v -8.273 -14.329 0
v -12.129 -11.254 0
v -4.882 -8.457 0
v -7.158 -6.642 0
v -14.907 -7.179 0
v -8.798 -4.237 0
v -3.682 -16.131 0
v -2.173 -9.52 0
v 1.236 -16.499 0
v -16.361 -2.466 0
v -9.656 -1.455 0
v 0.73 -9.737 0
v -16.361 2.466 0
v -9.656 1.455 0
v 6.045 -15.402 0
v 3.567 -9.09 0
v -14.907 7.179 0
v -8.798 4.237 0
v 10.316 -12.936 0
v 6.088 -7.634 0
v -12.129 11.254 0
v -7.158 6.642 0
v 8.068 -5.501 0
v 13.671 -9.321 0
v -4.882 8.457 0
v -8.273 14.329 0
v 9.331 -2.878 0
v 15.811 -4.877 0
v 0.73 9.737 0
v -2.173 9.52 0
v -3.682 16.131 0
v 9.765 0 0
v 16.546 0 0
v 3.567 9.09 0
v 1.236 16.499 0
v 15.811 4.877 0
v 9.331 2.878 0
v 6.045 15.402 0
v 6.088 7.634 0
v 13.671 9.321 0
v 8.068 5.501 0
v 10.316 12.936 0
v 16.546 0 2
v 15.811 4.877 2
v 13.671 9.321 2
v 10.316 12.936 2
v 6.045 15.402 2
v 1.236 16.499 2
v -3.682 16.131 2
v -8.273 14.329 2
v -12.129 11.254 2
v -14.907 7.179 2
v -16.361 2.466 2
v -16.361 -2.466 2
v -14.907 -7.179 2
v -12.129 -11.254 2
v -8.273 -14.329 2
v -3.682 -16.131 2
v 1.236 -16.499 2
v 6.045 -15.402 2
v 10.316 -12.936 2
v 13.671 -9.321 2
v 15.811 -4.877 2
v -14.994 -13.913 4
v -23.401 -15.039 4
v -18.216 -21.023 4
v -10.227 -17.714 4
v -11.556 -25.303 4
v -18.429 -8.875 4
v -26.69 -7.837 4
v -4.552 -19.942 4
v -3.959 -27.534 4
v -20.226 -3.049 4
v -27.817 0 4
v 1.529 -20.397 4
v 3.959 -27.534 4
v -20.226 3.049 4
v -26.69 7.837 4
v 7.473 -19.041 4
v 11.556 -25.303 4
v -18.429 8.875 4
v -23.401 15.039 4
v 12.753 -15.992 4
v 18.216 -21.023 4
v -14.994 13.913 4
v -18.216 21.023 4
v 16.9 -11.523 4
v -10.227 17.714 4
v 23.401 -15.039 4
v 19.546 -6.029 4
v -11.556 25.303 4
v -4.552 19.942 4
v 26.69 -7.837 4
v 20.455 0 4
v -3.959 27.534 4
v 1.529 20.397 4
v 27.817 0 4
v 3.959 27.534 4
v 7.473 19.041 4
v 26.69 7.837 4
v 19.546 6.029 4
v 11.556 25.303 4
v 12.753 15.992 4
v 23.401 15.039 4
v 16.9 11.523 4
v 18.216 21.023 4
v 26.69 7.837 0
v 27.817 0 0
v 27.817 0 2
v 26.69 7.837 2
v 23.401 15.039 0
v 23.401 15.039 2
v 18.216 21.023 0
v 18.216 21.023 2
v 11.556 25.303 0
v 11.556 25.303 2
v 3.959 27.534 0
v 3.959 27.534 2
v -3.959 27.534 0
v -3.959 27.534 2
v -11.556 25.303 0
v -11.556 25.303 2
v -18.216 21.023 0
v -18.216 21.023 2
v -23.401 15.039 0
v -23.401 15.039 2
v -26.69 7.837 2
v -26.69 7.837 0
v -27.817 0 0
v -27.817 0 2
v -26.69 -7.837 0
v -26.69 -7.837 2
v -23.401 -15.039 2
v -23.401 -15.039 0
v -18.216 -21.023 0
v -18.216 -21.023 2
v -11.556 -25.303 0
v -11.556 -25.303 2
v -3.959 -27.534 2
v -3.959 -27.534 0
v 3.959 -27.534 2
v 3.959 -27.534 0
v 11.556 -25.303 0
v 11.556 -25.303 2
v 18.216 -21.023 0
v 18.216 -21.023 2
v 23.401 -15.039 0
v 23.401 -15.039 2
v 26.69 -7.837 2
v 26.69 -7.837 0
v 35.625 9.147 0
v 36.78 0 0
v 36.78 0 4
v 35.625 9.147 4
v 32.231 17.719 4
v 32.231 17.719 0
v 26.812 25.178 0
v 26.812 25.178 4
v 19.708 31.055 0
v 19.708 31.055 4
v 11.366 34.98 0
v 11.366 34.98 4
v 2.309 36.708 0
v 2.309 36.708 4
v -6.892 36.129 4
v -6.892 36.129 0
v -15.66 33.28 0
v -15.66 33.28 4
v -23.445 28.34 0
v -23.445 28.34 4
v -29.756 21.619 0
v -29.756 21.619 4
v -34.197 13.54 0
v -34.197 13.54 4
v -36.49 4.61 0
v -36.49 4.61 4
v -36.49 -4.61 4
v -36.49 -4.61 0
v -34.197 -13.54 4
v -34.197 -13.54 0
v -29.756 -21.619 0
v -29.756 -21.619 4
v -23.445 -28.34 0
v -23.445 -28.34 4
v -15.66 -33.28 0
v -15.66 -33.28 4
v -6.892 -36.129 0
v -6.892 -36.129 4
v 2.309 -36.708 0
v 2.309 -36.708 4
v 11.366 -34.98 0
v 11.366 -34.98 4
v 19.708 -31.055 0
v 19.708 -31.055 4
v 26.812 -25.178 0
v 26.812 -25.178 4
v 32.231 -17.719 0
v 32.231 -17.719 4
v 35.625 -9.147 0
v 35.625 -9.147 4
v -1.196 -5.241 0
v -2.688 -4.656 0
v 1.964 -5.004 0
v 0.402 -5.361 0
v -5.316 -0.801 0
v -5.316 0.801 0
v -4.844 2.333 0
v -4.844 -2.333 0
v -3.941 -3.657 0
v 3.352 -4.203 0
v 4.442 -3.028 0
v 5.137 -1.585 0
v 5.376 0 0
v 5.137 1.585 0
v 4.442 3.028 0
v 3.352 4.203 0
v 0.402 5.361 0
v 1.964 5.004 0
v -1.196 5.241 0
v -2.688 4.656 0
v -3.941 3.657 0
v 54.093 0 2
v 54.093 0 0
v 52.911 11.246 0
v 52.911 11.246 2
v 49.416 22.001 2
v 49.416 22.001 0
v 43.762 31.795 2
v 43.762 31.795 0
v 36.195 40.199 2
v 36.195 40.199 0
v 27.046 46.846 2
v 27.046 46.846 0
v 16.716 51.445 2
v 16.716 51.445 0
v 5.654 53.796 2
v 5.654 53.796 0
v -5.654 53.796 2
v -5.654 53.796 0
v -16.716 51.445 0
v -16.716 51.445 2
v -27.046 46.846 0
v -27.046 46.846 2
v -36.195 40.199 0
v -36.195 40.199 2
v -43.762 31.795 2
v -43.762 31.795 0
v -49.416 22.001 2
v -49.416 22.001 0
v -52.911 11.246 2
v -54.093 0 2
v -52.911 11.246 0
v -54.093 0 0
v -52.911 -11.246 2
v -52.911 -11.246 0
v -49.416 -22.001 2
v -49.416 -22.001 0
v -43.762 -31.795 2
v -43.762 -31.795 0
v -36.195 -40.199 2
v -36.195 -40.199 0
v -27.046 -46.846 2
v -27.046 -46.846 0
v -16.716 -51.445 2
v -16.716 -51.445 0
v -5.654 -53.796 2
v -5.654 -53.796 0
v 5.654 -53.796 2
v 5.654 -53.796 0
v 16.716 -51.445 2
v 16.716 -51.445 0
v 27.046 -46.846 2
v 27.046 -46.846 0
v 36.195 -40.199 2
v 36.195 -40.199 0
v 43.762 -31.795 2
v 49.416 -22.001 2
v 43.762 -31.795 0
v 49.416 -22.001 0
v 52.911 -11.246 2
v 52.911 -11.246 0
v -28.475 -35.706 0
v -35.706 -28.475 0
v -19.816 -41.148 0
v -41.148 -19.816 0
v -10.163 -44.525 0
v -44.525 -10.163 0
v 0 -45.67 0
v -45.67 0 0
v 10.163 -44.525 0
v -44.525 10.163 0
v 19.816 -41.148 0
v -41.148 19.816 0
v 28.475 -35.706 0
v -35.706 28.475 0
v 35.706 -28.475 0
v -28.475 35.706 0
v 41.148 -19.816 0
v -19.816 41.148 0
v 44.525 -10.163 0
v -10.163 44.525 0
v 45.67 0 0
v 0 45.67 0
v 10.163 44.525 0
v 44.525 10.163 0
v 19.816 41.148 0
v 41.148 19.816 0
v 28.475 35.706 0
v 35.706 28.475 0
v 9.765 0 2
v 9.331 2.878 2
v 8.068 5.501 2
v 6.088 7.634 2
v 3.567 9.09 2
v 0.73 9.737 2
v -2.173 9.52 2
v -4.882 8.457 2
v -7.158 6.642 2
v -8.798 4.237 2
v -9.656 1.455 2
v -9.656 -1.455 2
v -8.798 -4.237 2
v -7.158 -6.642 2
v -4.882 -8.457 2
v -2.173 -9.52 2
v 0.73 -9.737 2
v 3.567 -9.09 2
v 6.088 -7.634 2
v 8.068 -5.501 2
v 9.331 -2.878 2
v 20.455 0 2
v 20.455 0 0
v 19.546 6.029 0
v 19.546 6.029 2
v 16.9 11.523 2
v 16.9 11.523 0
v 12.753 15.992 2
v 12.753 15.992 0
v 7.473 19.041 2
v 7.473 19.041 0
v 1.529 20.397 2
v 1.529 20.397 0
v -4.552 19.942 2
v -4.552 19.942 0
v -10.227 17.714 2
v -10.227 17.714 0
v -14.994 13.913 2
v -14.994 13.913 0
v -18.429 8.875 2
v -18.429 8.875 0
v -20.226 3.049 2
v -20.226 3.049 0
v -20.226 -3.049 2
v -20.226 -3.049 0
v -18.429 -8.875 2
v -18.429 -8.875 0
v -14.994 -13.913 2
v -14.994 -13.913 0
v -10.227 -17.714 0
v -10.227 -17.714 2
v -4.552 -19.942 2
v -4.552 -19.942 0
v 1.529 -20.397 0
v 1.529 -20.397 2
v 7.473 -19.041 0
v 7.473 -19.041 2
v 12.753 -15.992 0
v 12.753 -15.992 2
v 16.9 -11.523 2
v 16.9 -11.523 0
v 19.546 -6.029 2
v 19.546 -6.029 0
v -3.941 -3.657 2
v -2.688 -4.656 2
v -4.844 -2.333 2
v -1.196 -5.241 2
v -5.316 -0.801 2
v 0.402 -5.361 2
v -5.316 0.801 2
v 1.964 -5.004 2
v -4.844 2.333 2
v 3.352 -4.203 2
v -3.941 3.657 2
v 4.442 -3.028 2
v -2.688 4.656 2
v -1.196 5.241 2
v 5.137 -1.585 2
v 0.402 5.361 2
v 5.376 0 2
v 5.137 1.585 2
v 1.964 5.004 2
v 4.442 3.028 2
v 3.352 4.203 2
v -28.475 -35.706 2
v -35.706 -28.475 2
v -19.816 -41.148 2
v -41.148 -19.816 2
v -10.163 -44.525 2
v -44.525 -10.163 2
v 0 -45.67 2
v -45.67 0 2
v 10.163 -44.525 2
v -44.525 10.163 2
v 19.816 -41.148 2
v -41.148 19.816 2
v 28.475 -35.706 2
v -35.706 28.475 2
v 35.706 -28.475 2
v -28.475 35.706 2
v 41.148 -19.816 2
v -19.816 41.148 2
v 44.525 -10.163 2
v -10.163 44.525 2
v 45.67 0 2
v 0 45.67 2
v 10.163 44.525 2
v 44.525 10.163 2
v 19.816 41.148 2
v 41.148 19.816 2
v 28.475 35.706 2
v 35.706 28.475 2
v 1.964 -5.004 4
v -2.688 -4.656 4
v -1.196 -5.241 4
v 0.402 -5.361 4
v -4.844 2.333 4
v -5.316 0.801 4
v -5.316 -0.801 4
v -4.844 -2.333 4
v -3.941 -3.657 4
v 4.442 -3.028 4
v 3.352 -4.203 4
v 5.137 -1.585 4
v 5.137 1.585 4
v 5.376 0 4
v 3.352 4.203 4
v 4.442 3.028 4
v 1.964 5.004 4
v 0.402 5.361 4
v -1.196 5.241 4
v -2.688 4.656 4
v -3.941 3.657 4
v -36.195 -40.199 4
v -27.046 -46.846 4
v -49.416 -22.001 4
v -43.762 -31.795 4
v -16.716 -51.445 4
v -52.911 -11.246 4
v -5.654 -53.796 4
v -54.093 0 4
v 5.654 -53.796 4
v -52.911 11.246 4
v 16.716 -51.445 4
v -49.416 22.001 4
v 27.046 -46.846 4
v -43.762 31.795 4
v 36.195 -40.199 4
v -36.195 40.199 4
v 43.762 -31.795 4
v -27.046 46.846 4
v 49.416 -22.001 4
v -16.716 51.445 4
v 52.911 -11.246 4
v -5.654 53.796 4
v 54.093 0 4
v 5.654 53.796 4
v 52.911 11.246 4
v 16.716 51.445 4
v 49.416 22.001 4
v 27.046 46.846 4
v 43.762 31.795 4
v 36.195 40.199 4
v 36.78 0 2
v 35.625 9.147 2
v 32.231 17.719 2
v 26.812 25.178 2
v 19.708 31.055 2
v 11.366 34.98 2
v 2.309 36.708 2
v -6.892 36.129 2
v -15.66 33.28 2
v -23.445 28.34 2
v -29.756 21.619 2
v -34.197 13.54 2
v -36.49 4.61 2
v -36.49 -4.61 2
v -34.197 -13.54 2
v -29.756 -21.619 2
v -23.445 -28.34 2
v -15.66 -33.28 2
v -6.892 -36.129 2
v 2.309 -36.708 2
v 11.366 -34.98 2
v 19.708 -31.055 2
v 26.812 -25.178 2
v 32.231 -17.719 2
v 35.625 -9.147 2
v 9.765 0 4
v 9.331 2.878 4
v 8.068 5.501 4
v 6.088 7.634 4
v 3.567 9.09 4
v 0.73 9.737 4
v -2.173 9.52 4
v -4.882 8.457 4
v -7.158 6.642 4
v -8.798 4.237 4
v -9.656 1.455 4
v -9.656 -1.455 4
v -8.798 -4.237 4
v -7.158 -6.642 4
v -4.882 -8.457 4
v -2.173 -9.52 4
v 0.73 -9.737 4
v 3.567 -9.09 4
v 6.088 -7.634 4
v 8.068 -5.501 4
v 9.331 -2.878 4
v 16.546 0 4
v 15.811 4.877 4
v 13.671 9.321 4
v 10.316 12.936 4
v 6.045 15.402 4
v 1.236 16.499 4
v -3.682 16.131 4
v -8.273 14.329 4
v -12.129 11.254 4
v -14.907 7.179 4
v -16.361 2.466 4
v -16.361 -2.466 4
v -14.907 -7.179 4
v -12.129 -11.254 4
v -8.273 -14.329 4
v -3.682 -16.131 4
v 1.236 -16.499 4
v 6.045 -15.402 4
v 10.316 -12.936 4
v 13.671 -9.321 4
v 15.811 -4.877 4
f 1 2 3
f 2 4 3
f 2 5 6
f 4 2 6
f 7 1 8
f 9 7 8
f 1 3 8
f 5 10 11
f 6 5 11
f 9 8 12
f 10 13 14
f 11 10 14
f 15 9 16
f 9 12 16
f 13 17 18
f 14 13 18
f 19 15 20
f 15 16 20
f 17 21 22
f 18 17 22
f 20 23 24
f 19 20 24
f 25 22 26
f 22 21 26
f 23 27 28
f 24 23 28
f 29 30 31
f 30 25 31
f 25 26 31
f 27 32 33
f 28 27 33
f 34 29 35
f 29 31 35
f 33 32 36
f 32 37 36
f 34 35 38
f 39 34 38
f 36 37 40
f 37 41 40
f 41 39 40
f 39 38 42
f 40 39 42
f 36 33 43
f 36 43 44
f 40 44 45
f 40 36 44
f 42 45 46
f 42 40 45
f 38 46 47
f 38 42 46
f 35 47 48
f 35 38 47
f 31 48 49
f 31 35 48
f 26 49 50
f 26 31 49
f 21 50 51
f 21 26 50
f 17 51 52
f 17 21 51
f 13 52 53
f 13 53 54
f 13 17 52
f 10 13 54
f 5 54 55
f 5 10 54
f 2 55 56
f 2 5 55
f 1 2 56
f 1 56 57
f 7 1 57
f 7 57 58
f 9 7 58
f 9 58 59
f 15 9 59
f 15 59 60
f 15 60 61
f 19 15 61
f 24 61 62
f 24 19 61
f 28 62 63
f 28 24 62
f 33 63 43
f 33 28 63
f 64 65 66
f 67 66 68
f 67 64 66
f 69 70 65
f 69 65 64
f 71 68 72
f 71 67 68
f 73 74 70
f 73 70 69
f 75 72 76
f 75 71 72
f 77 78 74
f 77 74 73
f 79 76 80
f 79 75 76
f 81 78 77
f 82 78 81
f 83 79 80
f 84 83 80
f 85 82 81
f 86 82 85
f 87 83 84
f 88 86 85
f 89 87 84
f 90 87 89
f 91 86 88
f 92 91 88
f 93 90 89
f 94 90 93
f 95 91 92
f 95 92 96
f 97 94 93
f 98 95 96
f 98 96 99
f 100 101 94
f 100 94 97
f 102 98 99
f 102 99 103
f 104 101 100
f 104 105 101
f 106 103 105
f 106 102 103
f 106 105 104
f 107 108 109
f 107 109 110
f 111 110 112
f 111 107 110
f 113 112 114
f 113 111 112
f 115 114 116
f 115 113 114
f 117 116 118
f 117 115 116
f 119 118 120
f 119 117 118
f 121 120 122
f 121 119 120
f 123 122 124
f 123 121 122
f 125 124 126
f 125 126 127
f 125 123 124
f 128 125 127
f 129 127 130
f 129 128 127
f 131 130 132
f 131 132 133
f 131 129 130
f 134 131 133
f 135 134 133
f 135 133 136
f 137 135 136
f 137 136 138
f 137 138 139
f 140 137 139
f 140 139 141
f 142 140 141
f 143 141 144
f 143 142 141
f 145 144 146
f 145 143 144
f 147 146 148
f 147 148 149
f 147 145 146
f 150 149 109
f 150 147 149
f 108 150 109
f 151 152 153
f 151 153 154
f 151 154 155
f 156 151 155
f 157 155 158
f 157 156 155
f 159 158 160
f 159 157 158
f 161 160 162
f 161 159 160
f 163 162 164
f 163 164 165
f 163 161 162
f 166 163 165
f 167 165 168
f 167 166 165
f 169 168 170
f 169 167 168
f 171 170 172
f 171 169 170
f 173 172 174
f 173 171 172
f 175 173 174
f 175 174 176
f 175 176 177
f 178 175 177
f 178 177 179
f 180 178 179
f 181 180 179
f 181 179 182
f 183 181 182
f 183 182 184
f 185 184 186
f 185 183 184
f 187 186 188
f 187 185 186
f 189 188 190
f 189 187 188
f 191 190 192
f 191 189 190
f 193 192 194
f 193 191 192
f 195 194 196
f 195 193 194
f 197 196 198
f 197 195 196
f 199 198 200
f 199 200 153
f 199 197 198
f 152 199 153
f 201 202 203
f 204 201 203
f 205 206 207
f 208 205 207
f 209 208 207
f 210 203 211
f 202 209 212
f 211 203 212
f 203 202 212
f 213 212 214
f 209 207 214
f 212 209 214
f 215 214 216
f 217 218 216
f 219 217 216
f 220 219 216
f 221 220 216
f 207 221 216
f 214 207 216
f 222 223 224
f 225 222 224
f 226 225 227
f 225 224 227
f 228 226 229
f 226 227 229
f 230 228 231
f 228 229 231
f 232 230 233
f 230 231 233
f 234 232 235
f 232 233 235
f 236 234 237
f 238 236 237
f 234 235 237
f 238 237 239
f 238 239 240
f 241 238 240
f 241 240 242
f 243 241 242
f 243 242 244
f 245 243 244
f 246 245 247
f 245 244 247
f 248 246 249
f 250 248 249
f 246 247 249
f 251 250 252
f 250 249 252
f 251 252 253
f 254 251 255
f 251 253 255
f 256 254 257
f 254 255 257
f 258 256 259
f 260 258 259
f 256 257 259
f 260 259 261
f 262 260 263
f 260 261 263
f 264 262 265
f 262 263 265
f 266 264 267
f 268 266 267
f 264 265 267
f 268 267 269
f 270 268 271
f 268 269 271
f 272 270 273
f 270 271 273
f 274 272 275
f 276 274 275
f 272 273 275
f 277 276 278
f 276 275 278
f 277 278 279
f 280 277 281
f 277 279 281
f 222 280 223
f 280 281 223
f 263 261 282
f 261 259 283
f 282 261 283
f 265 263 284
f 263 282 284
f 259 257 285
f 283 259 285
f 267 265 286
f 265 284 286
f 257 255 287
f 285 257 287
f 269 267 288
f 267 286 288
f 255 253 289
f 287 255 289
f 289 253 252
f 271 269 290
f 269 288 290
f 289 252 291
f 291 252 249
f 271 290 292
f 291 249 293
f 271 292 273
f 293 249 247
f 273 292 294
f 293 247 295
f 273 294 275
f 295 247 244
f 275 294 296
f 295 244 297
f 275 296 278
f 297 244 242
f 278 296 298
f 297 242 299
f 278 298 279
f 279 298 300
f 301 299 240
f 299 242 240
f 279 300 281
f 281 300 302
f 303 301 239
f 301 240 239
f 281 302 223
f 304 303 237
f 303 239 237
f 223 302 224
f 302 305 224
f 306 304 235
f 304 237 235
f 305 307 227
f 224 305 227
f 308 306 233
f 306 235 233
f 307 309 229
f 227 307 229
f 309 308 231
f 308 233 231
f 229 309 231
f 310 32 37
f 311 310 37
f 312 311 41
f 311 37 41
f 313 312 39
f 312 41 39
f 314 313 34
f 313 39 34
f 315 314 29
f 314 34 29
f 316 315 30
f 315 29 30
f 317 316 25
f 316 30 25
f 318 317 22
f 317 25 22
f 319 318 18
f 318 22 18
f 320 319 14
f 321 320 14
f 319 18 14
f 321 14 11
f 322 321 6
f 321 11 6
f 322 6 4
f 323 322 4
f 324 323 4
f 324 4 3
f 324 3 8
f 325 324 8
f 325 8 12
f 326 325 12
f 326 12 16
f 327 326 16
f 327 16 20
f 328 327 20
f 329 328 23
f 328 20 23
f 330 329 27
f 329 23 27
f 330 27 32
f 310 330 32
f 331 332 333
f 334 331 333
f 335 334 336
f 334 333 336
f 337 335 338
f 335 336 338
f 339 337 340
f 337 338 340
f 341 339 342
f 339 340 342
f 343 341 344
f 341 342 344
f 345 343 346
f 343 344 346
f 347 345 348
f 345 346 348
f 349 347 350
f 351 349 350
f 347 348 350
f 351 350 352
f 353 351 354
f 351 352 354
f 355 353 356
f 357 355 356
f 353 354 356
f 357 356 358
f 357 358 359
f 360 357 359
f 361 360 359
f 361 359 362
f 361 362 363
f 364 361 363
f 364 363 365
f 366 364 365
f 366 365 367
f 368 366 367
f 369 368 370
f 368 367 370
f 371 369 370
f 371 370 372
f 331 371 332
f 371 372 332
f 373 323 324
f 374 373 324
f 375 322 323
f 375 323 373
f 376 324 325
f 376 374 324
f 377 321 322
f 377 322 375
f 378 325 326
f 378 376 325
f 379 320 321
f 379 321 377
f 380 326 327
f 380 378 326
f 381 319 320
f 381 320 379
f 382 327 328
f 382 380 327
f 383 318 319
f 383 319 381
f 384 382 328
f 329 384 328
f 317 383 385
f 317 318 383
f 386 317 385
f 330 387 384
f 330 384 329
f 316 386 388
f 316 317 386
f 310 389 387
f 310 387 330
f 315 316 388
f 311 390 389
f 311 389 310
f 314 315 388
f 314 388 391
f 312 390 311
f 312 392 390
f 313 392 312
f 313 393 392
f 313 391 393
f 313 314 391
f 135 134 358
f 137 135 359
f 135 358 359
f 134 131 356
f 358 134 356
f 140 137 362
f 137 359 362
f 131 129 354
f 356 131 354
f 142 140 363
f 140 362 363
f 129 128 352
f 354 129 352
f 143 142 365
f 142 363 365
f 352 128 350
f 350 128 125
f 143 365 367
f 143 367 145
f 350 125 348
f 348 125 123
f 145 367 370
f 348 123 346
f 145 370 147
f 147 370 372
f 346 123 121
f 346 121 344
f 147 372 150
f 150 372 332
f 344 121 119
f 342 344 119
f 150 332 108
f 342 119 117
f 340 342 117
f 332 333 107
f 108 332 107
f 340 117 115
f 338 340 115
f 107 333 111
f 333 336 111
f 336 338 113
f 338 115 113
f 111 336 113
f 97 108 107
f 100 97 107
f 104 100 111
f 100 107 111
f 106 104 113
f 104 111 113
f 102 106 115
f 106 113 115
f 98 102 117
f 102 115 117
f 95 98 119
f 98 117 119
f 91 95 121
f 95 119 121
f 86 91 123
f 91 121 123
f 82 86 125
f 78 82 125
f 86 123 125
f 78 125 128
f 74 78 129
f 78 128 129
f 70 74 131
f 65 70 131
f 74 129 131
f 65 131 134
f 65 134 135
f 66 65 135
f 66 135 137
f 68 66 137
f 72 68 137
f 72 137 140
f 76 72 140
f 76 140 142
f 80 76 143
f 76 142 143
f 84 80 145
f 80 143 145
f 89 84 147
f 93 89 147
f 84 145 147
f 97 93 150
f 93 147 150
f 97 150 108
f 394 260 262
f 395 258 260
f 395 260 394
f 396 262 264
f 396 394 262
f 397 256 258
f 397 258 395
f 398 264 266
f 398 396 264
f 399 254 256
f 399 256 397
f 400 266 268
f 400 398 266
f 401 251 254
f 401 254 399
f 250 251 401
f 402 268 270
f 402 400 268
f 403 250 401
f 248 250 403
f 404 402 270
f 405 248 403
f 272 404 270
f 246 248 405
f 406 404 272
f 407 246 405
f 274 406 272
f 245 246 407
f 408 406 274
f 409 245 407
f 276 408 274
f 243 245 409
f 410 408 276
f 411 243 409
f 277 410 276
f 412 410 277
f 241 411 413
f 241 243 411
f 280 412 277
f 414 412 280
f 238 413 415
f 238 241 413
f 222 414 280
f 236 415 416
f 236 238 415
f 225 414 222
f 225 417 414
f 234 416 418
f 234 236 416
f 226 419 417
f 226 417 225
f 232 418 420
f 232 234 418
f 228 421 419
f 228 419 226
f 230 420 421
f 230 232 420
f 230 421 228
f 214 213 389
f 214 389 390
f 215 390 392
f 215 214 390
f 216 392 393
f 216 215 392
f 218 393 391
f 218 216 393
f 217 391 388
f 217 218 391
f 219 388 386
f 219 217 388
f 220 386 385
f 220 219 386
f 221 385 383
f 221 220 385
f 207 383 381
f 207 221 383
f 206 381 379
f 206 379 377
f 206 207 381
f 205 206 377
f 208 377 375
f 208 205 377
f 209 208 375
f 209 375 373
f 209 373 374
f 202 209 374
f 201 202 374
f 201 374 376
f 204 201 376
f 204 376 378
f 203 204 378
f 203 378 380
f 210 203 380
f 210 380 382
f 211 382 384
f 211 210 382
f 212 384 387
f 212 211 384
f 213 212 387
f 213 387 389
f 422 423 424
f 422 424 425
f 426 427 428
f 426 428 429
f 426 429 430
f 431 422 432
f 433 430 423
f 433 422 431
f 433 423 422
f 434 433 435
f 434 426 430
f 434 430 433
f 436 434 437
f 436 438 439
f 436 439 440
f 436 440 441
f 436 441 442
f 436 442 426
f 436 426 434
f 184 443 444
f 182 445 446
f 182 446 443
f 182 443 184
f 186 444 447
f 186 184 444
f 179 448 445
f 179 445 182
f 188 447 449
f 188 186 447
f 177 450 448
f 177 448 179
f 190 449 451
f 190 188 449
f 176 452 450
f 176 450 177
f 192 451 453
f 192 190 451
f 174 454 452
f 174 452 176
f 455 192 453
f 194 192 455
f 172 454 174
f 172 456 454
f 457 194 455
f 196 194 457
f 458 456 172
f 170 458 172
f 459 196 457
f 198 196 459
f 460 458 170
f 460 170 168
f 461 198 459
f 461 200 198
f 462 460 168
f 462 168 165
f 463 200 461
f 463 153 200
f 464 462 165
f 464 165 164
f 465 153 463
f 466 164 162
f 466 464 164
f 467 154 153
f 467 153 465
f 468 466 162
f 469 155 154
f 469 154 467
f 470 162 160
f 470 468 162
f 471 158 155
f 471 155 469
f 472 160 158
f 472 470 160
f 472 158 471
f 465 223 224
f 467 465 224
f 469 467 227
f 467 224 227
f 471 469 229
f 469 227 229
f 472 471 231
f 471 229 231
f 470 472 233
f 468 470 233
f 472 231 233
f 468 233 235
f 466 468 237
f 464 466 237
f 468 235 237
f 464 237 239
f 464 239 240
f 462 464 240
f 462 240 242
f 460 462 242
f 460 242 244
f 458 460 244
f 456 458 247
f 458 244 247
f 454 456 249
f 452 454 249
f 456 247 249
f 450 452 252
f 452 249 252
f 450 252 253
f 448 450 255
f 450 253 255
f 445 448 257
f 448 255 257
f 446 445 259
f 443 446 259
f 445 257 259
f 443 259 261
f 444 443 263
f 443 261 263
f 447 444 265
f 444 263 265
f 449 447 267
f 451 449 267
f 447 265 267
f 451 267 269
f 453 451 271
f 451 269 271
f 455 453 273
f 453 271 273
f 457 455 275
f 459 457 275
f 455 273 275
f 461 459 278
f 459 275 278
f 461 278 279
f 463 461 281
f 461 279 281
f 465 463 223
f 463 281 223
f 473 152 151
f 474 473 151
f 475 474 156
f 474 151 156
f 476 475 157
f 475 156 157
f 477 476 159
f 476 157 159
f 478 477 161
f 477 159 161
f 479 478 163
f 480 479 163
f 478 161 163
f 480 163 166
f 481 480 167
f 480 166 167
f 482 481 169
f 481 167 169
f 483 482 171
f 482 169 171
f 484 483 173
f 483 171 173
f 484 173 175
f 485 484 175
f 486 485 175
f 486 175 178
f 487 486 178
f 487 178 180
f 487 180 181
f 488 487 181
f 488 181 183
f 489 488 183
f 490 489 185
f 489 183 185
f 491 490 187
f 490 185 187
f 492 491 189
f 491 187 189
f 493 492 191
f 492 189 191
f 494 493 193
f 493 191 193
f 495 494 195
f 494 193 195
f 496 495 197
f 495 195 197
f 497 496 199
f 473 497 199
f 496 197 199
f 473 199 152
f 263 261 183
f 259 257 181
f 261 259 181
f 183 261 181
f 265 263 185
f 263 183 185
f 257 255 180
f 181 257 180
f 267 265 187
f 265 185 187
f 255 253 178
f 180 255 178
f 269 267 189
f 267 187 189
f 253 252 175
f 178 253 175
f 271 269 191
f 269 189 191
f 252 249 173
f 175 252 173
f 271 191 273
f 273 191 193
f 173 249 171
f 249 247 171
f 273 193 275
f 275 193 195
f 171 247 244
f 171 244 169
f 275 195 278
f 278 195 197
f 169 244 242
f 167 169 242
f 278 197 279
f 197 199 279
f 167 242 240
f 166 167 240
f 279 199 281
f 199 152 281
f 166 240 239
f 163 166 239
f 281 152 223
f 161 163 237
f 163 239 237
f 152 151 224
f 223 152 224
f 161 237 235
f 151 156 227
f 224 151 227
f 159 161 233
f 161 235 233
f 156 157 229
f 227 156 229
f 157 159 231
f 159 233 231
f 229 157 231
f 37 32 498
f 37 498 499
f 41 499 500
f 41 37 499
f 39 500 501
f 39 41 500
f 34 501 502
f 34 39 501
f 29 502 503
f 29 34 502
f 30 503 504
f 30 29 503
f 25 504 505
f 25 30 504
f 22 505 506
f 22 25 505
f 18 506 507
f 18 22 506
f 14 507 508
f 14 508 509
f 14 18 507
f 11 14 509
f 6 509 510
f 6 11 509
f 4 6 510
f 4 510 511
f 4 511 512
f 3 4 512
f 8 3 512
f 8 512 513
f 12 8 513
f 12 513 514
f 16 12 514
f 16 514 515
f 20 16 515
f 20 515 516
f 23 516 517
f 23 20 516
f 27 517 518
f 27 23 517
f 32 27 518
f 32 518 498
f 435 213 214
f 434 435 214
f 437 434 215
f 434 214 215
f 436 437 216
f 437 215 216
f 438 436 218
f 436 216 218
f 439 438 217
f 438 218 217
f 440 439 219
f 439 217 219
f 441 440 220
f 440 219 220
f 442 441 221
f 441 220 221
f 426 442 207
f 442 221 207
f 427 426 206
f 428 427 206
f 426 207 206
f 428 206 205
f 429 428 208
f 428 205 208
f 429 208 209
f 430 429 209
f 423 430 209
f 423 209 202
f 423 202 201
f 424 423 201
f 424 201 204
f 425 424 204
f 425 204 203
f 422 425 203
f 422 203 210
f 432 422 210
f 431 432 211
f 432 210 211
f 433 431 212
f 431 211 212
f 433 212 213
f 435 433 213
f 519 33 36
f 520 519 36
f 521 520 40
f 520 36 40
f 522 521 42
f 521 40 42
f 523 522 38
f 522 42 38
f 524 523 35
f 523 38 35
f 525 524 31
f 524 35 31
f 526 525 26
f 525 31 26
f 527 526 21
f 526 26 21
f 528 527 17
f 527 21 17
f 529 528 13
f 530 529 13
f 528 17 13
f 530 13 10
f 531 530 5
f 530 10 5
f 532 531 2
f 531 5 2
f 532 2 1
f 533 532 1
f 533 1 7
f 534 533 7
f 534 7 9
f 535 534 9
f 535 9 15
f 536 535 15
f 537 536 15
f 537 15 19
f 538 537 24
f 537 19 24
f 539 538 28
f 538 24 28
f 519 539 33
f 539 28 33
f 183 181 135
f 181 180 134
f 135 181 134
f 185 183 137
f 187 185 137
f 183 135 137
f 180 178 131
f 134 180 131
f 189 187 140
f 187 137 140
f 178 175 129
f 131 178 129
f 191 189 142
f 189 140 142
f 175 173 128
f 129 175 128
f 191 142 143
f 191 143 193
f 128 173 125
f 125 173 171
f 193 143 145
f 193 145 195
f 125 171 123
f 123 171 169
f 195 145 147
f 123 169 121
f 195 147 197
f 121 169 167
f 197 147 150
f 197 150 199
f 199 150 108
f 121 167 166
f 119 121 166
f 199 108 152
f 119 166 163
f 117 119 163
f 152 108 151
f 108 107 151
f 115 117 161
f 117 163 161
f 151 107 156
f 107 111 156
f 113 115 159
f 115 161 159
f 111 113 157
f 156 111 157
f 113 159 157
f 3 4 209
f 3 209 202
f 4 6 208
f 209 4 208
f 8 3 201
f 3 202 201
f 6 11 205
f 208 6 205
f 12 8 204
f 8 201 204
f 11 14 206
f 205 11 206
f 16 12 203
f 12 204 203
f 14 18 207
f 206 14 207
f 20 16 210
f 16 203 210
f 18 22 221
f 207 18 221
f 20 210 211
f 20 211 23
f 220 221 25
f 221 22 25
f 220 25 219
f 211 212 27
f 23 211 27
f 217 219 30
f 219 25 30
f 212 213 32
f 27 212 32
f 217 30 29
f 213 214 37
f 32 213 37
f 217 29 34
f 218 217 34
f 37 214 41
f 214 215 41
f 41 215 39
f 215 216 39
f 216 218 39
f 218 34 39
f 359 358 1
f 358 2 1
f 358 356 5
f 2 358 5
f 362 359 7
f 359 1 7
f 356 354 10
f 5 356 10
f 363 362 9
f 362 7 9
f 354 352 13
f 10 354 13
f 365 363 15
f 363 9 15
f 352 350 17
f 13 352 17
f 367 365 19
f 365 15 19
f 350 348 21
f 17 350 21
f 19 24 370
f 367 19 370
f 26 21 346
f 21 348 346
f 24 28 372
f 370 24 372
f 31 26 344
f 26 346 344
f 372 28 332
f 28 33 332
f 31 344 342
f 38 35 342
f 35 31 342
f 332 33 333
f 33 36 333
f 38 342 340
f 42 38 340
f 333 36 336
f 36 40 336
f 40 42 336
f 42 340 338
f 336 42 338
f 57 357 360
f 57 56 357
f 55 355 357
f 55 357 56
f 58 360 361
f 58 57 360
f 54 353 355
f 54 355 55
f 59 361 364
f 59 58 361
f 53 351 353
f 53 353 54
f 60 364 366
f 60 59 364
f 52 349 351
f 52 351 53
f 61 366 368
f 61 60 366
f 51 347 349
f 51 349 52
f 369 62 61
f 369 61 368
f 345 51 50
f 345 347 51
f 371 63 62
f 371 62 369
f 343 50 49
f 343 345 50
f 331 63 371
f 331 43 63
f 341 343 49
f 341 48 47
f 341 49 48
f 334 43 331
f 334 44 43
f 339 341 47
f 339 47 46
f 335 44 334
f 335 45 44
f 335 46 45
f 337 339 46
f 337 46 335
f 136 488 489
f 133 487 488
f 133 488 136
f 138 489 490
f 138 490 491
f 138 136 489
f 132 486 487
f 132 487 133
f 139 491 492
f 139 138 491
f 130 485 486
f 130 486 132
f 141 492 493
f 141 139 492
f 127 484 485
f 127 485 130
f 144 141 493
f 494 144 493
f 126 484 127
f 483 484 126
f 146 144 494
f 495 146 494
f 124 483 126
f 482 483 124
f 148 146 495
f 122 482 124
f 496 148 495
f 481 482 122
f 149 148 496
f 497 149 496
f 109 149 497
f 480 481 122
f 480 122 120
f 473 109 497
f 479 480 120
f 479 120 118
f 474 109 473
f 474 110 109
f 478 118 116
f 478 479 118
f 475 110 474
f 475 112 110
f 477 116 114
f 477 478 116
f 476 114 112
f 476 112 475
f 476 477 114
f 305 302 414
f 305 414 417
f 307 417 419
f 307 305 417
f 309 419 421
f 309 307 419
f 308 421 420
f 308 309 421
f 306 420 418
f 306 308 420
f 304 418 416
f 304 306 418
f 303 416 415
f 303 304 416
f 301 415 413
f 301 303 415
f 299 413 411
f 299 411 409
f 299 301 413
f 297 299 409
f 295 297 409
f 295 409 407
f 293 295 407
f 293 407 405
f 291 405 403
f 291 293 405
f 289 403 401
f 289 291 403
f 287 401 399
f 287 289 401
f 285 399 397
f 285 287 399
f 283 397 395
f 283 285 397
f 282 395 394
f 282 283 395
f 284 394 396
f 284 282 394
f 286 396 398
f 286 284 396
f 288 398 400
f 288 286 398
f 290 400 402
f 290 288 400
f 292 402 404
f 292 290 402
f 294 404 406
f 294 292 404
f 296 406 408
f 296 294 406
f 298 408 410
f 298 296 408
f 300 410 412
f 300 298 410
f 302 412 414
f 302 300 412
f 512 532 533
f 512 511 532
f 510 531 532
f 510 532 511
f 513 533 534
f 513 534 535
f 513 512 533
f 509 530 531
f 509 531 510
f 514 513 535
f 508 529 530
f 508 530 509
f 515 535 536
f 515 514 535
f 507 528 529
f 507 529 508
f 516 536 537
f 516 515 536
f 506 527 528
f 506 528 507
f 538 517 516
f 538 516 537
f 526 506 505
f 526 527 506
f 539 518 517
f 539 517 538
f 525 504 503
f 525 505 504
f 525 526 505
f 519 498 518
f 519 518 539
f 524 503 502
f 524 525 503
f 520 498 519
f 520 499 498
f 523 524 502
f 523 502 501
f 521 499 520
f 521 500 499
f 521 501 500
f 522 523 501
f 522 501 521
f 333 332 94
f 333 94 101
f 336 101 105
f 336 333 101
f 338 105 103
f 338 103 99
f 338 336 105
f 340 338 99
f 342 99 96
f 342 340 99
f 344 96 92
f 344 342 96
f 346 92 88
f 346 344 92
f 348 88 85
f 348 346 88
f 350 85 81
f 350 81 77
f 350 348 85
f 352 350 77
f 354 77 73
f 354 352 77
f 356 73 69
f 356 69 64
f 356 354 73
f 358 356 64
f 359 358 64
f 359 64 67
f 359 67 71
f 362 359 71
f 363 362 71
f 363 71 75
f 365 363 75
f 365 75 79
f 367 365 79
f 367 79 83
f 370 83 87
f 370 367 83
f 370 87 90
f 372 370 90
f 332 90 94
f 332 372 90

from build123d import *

# Parameters (mm, degrees)
F0_R     = 9.764761451
F0_R_2   = 5.3761065938
F1_DEPTH = 2
F0_R_3   = 36.7802763419
F0_R_4   = 27.8170231567
F0_R_5   = 20.4546501633
F0_R_6   = 16.5457306789
F0_R_7   = 54.0926326678
F0_R_8   = 45.670326034
F2_DEPTH = 4


with BuildPart() as f1:
    # F0 (on Top) → F1 (new body)
    with BuildSketch(Plane.XY):
        Circle(F0_R)
        Circle(F0_R_2, mode=Mode.SUBTRACT)
    extrude(amount=F1_DEPTH)


with BuildPart() as f1b:
    # F0 (on Top) → F1, piece 2 (new body)
    with BuildSketch(Plane.XY):
        Circle(F0_R_3)
        Circle(F0_R_4, mode=Mode.SUBTRACT)
    extrude(amount=F1_DEPTH)


with BuildPart() as f1c:
    # F0 (on Top) → F1, piece 3 (new body)
    with BuildSketch(Plane.XY):
        Circle(F0_R_5)
        Circle(F0_R_6, mode=Mode.SUBTRACT)
    extrude(amount=F1_DEPTH)


with BuildPart() as f1d:
    # F0 (on Top) → F1, piece 4 (new body)
    with BuildSketch(Plane.XY):
        Circle(F0_R_7)
        Circle(F0_R_8, mode=Mode.SUBTRACT)
    extrude(amount=F1_DEPTH)


with BuildPart() as f2:
    # F0 (on Top) → F2 (new body)
    with BuildSketch(Plane.XY):
        Circle(F0_R_7)
        Circle(F0_R_8, mode=Mode.SUBTRACT)
        Circle(F0_R_8)
        Circle(F0_R_3, mode=Mode.SUBTRACT)
    extrude(amount=F2_DEPTH)


with BuildPart() as f2b:
    # F0 (on Top) → F2, piece 2 (new body)
    with BuildSketch(Plane.XY):
        Circle(F0_R_4)
        Circle(F0_R_5, mode=Mode.SUBTRACT)
    extrude(amount=F2_DEPTH)


with BuildPart() as f2c:
    # F0 (on Top) → F2, piece 3 (new body)
    with BuildSketch(Plane.XY):
        Circle(F0_R_6)
        Circle(F0_R, mode=Mode.SUBTRACT)
    extrude(amount=F2_DEPTH)


with BuildPart() as f2d:
    # F0 (on Top) → F2, piece 4 (new body)
    with BuildSketch(Plane.XY):
        Circle(F0_R_2)
    extrude(amount=F2_DEPTH)


solid = Compound([f1.part, f1b.part, f1c.part, f1d.part, f2.part, f2b.part, f2c.part, f2d.part])
